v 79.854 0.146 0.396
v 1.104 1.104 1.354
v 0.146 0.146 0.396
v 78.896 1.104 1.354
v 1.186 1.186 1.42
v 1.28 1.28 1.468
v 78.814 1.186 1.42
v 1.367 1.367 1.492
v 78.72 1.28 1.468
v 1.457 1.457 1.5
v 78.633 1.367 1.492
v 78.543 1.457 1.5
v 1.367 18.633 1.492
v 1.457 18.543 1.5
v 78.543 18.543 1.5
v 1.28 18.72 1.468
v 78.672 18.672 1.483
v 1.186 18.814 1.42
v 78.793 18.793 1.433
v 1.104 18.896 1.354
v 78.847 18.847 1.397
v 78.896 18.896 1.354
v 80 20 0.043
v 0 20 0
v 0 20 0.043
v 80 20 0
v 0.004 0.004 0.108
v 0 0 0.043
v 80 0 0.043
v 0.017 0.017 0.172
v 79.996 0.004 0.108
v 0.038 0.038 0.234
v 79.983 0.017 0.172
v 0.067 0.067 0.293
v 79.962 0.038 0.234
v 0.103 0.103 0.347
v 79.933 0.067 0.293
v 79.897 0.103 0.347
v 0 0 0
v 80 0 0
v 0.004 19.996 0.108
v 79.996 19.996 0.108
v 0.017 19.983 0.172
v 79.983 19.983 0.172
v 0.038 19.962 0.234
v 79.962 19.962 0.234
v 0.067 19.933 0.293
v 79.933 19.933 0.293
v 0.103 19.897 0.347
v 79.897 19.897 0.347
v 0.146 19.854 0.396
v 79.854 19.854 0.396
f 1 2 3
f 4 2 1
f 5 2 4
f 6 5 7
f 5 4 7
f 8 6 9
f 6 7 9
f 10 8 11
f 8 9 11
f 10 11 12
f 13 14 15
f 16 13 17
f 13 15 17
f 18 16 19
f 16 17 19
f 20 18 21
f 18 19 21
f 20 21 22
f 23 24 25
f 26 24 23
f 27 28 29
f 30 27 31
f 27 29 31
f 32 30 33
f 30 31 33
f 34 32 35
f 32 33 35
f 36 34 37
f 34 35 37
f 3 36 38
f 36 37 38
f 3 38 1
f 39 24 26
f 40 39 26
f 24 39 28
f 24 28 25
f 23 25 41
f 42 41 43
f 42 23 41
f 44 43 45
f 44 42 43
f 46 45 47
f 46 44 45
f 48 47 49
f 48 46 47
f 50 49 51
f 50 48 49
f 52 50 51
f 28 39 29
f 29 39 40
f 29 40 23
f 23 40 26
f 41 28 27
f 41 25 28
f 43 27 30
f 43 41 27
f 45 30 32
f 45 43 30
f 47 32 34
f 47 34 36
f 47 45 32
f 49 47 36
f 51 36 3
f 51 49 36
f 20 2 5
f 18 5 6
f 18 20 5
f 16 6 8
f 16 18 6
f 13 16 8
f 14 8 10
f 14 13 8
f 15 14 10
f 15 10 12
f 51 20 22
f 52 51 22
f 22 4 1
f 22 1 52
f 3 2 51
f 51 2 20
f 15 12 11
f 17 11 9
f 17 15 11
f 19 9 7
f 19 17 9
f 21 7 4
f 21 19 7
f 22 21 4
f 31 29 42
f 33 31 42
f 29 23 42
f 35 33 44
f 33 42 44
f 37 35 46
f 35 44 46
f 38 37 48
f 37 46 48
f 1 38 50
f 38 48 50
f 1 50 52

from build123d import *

# Parameters (mm, degrees)
F0_W     = 80
F0_H     = 20
F1_DEPTH = 1.5
F2_SIZE  = 1.25
F3_R     = 0.5


with BuildPart() as f1:
    # F0 (on Top) → F1 (new body)
    with BuildSketch(Plane.XY):
        with Locations((40, 10)):
            Rectangle(F0_W, F0_H)
    extrude(amount=F1_DEPTH)

    # F2
    f2_edges = [f1.edges().sort_by_distance(p)[0] for p in [
        (0, 10, 1.5),
        (40, 0, 1.5),
        (80, 10, 1.5),
        (40, 20, 1.5),
    ]]
    chamfer(f2_edges, length=F2_SIZE)

    # F3
    f3_edges = [f1.edges().sort_by_distance(p)[0] for p in [
        (1.25, 10, 1.5),
        (40, 18.75, 1.5),
        (40, 1.25, 1.5),
        (78.75, 10, 1.5),
        (80, 10, 0.25),
        (40, 0, 0.25),
        (40, 20, 0.25),
        (0, 10, 0.25),
    ]]
    fillet(f3_edges, radius=F3_R)


solid = f1.part
